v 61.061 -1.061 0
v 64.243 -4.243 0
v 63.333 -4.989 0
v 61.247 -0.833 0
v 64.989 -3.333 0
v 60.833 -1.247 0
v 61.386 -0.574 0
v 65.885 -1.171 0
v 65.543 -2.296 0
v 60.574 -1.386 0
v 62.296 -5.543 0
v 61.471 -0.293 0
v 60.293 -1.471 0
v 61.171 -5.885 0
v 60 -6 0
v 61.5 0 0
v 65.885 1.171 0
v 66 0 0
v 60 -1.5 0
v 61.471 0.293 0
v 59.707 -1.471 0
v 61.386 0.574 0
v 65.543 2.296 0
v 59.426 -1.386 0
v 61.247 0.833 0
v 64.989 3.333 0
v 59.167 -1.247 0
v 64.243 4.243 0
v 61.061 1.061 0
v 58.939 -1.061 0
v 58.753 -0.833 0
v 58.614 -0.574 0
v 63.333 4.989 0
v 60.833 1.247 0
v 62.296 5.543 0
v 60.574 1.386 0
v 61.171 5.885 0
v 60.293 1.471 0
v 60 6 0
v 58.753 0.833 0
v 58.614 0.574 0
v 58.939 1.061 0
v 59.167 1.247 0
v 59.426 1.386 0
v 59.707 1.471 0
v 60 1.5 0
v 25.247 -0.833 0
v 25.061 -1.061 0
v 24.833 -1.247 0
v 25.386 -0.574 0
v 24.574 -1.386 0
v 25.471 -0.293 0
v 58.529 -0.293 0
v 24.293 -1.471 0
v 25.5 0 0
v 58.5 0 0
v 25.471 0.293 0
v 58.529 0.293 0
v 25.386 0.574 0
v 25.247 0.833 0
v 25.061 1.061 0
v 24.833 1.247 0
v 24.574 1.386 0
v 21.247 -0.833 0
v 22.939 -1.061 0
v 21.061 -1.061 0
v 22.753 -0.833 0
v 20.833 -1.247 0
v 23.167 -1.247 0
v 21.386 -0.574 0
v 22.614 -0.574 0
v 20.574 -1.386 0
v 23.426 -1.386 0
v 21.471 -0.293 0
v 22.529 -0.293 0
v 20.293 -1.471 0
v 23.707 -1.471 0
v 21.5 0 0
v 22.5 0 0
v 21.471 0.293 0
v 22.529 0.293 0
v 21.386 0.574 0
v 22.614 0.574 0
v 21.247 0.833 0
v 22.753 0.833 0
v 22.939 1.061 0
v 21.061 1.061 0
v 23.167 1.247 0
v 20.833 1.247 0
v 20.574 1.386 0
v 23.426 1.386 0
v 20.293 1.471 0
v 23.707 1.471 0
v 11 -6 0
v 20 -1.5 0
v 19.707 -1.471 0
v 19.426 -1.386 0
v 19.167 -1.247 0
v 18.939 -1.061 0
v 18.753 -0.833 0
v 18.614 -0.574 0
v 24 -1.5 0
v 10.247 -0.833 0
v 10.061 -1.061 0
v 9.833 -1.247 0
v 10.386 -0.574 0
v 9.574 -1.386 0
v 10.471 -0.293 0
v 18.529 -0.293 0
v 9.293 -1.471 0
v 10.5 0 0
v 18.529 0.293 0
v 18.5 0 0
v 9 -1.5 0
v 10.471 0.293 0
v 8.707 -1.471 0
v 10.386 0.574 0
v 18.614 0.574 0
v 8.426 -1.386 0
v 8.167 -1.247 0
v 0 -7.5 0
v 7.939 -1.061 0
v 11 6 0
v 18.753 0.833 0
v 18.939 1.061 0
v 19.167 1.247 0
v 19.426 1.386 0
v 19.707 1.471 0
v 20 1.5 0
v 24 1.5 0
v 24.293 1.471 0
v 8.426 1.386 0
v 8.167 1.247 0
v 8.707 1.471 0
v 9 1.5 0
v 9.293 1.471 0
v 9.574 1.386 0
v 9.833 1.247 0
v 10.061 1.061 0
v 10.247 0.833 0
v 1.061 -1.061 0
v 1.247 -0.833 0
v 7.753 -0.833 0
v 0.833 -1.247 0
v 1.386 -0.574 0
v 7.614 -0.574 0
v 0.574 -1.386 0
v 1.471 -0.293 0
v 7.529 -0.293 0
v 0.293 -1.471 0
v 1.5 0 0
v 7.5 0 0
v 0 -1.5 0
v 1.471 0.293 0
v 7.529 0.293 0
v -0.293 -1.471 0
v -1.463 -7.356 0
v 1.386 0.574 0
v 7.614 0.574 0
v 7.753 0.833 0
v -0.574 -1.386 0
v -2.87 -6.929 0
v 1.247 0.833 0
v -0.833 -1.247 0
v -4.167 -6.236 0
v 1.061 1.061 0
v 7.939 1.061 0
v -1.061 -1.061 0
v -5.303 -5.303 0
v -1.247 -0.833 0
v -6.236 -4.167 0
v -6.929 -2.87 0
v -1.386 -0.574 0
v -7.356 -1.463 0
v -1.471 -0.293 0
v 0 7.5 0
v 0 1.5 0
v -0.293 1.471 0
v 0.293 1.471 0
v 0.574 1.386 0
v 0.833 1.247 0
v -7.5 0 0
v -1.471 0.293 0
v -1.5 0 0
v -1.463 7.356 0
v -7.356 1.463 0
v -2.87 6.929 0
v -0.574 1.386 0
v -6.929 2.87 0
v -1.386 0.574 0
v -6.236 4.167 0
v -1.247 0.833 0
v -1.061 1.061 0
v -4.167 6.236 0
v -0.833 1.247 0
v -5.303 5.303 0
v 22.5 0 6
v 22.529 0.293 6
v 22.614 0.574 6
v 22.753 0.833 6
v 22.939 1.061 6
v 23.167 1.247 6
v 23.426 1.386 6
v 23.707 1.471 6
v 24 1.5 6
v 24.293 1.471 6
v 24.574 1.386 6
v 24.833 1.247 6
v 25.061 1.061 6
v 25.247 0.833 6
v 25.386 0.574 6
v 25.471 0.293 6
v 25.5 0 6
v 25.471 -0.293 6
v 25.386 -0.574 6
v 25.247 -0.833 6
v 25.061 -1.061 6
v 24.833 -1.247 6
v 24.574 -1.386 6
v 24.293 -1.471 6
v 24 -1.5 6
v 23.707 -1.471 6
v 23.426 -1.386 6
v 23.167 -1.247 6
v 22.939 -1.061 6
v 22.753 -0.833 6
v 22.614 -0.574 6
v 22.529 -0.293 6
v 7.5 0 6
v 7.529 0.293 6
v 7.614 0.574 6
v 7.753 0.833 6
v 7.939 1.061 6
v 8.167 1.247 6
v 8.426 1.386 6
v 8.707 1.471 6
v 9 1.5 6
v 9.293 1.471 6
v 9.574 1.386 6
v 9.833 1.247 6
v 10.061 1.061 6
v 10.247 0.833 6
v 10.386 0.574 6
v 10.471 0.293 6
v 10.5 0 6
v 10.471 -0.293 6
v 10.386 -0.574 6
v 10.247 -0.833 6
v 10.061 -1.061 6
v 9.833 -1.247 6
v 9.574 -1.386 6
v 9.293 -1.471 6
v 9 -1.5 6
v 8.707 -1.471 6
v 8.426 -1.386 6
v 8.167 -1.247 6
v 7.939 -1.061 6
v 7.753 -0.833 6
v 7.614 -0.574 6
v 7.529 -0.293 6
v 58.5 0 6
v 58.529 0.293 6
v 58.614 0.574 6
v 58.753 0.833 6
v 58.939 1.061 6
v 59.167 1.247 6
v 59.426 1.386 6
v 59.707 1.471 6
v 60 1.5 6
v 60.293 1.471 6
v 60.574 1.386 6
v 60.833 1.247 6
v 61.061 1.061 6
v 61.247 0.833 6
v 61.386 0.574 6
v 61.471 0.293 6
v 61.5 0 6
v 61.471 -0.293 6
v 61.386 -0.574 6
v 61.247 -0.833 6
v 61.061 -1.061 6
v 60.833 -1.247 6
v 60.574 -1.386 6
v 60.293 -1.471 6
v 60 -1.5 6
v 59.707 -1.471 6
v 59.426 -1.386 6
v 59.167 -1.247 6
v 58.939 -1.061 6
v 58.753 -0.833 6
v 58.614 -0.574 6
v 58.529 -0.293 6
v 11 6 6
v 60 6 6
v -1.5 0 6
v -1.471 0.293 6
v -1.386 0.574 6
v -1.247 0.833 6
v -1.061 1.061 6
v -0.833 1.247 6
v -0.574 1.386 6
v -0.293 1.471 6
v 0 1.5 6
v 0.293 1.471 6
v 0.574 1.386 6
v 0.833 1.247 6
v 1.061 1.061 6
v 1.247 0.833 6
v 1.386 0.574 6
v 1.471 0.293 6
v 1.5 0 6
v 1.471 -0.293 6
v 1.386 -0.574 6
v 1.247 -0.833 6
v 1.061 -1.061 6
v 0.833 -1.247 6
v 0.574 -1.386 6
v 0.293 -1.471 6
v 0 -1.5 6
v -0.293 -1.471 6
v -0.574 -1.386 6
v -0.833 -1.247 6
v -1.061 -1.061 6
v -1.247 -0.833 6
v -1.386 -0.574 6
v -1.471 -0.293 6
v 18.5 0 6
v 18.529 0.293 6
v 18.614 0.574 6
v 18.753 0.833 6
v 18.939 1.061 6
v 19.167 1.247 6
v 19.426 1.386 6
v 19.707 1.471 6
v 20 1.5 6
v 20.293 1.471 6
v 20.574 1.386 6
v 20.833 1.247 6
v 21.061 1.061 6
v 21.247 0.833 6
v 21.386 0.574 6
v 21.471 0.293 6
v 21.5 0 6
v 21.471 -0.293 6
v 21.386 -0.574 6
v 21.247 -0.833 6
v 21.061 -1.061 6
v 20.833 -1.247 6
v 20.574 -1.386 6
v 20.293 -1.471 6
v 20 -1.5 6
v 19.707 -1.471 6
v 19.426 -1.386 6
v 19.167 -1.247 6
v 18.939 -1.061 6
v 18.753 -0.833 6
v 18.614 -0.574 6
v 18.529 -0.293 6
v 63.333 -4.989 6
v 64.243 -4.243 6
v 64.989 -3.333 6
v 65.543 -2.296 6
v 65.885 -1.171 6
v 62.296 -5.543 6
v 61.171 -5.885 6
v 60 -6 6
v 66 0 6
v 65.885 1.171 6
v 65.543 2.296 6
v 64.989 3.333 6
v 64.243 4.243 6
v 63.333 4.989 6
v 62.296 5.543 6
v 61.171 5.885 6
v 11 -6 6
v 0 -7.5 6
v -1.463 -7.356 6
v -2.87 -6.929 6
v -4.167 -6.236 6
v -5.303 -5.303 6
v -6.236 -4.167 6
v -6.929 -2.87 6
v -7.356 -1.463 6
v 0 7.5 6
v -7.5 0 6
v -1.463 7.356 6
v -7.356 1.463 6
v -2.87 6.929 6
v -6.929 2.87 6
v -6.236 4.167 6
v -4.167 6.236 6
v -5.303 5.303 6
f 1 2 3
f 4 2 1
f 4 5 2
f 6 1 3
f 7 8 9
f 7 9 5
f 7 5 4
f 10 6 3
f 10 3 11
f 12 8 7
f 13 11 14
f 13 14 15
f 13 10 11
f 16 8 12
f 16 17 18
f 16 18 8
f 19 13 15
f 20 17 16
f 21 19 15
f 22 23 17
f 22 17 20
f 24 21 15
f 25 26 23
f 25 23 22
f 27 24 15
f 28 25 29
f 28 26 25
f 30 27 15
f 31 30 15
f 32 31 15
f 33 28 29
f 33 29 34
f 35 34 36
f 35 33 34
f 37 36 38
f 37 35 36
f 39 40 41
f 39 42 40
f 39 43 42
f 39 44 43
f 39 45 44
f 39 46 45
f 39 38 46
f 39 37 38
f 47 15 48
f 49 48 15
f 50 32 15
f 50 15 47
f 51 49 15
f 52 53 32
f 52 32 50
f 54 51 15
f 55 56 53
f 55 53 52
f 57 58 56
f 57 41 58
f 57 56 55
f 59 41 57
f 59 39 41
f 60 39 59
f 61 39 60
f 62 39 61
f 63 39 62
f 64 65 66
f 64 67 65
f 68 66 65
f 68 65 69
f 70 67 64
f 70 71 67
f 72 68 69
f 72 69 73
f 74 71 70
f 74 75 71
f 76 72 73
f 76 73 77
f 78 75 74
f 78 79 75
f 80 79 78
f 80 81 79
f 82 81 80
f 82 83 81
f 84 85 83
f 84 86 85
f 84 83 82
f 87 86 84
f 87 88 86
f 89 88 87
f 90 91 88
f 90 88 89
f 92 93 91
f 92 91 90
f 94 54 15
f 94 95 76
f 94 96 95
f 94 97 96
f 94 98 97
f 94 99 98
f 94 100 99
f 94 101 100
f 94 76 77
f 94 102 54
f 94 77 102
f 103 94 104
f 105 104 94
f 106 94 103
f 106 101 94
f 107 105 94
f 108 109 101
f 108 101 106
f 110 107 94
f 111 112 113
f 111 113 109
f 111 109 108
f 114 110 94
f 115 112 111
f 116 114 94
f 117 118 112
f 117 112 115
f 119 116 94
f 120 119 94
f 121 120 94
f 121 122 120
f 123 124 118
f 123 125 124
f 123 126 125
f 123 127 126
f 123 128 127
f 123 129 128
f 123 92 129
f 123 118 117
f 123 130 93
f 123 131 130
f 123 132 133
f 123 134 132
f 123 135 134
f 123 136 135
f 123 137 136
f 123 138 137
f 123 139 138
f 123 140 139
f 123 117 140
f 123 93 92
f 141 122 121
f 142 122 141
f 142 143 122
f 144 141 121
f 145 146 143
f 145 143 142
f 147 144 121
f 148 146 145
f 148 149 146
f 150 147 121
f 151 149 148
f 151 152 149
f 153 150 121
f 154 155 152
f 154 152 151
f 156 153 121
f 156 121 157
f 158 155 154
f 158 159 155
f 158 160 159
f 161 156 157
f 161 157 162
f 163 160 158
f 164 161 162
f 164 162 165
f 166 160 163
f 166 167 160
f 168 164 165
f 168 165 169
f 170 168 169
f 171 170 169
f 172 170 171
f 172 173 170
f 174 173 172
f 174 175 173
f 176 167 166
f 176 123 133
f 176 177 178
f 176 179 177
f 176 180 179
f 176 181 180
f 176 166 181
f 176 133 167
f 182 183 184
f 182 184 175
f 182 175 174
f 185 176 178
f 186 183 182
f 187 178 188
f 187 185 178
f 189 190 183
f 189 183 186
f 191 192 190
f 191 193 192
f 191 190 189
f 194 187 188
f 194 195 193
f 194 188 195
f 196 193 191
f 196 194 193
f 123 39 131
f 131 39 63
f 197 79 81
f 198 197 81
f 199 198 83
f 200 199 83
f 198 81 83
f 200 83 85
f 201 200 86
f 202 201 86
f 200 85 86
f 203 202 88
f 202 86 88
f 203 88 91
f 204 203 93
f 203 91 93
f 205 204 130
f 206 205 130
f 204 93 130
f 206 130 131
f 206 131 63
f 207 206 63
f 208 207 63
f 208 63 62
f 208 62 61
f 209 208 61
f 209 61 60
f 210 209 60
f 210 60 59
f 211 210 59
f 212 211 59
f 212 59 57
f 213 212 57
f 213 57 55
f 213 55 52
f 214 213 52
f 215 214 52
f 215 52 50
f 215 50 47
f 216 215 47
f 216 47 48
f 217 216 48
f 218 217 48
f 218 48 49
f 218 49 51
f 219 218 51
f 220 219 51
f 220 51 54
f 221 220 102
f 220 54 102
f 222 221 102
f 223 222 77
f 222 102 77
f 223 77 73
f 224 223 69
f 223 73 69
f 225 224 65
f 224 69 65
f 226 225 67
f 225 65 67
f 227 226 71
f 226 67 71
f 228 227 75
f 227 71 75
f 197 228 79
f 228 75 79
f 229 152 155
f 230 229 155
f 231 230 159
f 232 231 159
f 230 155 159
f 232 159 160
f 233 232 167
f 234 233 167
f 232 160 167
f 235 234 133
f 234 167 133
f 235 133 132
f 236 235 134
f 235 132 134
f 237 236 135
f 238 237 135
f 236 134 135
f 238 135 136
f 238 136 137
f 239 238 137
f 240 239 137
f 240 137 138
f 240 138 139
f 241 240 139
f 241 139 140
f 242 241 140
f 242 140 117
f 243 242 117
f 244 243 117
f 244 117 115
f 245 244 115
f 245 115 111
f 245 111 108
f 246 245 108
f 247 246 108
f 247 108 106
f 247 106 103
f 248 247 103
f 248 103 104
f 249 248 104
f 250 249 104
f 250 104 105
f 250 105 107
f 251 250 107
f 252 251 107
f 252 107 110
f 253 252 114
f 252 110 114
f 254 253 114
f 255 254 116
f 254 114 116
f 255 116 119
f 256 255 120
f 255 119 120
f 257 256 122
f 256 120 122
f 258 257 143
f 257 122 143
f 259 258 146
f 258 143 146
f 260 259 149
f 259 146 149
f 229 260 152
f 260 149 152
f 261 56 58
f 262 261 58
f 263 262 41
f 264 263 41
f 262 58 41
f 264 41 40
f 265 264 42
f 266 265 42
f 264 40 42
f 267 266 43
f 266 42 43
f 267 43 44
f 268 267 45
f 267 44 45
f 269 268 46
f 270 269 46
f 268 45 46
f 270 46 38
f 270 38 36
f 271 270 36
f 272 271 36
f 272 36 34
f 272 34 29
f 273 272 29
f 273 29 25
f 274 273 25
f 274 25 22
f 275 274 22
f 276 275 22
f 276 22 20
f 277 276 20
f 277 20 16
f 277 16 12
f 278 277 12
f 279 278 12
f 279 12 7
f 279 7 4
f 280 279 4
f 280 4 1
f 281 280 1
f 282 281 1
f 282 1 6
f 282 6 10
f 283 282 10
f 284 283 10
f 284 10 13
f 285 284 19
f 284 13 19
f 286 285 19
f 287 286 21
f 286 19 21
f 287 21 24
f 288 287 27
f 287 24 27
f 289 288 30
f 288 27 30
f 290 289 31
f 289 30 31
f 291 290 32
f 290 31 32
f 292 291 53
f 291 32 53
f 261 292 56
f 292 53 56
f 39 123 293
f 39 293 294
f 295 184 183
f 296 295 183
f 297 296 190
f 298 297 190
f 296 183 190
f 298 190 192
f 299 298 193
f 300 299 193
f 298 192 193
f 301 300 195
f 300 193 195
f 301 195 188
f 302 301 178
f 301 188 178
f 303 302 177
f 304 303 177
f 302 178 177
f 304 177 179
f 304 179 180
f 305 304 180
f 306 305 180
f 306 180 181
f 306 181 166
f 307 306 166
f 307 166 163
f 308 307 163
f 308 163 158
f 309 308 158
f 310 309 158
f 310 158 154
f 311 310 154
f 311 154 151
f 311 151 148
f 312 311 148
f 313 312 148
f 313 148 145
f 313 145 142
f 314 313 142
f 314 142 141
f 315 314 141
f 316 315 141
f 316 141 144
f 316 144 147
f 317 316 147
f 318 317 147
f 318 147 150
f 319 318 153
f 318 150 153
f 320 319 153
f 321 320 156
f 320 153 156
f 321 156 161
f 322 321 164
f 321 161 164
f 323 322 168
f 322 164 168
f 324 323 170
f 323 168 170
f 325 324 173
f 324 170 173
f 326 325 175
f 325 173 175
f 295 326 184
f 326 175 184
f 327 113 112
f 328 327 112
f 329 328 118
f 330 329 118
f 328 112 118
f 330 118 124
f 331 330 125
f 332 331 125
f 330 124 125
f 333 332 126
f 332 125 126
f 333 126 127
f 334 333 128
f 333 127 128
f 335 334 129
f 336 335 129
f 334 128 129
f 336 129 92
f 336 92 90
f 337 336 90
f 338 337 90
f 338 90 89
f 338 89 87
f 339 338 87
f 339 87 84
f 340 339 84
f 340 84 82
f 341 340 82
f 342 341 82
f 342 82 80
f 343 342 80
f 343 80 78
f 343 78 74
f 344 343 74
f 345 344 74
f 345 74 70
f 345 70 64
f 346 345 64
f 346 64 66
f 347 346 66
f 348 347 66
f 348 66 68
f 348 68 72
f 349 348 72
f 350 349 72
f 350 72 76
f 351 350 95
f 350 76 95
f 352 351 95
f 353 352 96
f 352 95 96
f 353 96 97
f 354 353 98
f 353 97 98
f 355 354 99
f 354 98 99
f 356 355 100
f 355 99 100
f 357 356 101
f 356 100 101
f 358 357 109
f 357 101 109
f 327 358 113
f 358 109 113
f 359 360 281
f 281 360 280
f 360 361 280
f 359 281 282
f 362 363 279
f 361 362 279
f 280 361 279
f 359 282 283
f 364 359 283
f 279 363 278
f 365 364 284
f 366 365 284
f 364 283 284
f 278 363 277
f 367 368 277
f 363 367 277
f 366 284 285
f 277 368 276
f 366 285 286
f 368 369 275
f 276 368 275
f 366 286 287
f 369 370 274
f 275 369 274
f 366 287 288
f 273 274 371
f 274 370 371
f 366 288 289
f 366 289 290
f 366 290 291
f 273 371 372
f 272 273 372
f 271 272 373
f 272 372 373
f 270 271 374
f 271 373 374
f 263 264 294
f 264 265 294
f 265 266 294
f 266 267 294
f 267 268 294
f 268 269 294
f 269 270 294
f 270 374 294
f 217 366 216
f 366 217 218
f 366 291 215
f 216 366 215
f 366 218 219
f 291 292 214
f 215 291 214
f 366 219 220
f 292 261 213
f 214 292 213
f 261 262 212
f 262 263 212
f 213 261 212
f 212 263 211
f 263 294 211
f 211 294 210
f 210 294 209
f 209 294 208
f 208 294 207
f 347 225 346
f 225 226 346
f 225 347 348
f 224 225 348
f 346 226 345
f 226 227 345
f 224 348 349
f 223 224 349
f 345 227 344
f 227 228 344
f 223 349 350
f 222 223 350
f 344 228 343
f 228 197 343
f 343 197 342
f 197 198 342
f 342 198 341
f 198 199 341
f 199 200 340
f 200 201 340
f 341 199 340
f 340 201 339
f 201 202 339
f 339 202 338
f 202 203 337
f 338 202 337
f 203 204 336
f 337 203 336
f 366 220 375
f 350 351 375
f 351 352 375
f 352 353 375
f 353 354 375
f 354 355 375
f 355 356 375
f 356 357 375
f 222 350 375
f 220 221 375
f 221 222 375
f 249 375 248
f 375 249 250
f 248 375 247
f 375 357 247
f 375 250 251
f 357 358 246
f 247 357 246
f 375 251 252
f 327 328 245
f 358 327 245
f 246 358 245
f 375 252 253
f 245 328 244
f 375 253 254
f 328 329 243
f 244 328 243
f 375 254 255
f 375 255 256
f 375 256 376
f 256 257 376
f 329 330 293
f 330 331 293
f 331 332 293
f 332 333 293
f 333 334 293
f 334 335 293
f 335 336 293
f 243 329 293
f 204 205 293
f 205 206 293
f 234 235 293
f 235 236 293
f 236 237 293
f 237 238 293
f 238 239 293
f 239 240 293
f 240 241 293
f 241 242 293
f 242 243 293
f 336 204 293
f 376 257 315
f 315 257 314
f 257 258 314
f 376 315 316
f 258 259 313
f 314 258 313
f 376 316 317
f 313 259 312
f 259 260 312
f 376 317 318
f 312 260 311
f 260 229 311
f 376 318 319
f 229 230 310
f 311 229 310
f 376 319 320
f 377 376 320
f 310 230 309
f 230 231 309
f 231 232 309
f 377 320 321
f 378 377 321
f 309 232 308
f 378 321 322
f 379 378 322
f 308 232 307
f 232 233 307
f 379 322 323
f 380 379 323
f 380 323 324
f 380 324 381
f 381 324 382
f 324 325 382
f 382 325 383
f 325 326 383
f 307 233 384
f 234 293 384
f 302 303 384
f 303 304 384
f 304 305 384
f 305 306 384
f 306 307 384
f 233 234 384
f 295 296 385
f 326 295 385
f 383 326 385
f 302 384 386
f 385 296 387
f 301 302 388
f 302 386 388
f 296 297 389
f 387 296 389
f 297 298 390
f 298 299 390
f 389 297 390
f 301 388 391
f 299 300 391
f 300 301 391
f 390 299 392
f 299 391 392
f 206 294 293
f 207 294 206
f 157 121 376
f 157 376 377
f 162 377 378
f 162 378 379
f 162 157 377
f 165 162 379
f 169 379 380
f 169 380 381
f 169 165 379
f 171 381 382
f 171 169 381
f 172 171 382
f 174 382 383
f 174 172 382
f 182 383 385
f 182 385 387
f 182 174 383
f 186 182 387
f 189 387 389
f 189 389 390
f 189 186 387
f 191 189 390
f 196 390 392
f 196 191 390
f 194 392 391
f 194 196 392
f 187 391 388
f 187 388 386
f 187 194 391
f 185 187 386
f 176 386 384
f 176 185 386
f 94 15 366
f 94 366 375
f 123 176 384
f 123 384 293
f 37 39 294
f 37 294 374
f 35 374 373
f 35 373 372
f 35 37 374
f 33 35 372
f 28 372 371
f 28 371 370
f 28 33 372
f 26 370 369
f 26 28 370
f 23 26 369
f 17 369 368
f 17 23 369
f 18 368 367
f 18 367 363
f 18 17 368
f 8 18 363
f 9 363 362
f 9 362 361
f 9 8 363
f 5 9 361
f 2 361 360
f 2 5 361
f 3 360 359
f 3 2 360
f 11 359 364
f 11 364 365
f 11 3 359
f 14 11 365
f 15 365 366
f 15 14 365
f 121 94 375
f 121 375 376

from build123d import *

# Parameters (mm, degrees)
EXTRUDE_1_DEPTH    = 6
HOLE_WIZARD_M3_1_D = 3
EXTRUDE_3_DEPTH    = 6


with BuildPart() as part:
    # 草图1 → 凸台-拉伸1 (new body)
    with BuildSketch(Plane.XY):
        with BuildLine():
            Line((0, 6), (60, 6))
            ThreePointArc((60, 6), (66, 0), (60, -6))
            Line((60, -6), (0, -6))
            ThreePointArc((0, -6), (-6, 0), (0, 6))
        make_face()
    extrude(amount=EXTRUDE_1_DEPTH)

    # M3 螺纹孔1 (through all)
    with Locations(Plane.XY.offset(6)):
        with Locations((0, 0), (60, 0), (9, 0), (20, 0), (24, 0)):
            Hole(HOLE_WIZARD_M3_1_D / 2)

    # 草图4 → 凸台-拉伸3 (add)
    with BuildSketch(Plane.XY):
        with BuildLine():
            Line((0, 7.5), (11, 6))
            Line((11, 6), (0, 6))
            ThreePointArc((0, 6), (-6, 0), (0, -6))
            Line((0, -6), (11, -6))
            Line((11, -6), (0, -7.5))
            ThreePointArc((0, -7.5), (-7.5, 0), (0, 7.5))
        make_face()
    extrude(amount=EXTRUDE_3_DEPTH)


solid = part.part
